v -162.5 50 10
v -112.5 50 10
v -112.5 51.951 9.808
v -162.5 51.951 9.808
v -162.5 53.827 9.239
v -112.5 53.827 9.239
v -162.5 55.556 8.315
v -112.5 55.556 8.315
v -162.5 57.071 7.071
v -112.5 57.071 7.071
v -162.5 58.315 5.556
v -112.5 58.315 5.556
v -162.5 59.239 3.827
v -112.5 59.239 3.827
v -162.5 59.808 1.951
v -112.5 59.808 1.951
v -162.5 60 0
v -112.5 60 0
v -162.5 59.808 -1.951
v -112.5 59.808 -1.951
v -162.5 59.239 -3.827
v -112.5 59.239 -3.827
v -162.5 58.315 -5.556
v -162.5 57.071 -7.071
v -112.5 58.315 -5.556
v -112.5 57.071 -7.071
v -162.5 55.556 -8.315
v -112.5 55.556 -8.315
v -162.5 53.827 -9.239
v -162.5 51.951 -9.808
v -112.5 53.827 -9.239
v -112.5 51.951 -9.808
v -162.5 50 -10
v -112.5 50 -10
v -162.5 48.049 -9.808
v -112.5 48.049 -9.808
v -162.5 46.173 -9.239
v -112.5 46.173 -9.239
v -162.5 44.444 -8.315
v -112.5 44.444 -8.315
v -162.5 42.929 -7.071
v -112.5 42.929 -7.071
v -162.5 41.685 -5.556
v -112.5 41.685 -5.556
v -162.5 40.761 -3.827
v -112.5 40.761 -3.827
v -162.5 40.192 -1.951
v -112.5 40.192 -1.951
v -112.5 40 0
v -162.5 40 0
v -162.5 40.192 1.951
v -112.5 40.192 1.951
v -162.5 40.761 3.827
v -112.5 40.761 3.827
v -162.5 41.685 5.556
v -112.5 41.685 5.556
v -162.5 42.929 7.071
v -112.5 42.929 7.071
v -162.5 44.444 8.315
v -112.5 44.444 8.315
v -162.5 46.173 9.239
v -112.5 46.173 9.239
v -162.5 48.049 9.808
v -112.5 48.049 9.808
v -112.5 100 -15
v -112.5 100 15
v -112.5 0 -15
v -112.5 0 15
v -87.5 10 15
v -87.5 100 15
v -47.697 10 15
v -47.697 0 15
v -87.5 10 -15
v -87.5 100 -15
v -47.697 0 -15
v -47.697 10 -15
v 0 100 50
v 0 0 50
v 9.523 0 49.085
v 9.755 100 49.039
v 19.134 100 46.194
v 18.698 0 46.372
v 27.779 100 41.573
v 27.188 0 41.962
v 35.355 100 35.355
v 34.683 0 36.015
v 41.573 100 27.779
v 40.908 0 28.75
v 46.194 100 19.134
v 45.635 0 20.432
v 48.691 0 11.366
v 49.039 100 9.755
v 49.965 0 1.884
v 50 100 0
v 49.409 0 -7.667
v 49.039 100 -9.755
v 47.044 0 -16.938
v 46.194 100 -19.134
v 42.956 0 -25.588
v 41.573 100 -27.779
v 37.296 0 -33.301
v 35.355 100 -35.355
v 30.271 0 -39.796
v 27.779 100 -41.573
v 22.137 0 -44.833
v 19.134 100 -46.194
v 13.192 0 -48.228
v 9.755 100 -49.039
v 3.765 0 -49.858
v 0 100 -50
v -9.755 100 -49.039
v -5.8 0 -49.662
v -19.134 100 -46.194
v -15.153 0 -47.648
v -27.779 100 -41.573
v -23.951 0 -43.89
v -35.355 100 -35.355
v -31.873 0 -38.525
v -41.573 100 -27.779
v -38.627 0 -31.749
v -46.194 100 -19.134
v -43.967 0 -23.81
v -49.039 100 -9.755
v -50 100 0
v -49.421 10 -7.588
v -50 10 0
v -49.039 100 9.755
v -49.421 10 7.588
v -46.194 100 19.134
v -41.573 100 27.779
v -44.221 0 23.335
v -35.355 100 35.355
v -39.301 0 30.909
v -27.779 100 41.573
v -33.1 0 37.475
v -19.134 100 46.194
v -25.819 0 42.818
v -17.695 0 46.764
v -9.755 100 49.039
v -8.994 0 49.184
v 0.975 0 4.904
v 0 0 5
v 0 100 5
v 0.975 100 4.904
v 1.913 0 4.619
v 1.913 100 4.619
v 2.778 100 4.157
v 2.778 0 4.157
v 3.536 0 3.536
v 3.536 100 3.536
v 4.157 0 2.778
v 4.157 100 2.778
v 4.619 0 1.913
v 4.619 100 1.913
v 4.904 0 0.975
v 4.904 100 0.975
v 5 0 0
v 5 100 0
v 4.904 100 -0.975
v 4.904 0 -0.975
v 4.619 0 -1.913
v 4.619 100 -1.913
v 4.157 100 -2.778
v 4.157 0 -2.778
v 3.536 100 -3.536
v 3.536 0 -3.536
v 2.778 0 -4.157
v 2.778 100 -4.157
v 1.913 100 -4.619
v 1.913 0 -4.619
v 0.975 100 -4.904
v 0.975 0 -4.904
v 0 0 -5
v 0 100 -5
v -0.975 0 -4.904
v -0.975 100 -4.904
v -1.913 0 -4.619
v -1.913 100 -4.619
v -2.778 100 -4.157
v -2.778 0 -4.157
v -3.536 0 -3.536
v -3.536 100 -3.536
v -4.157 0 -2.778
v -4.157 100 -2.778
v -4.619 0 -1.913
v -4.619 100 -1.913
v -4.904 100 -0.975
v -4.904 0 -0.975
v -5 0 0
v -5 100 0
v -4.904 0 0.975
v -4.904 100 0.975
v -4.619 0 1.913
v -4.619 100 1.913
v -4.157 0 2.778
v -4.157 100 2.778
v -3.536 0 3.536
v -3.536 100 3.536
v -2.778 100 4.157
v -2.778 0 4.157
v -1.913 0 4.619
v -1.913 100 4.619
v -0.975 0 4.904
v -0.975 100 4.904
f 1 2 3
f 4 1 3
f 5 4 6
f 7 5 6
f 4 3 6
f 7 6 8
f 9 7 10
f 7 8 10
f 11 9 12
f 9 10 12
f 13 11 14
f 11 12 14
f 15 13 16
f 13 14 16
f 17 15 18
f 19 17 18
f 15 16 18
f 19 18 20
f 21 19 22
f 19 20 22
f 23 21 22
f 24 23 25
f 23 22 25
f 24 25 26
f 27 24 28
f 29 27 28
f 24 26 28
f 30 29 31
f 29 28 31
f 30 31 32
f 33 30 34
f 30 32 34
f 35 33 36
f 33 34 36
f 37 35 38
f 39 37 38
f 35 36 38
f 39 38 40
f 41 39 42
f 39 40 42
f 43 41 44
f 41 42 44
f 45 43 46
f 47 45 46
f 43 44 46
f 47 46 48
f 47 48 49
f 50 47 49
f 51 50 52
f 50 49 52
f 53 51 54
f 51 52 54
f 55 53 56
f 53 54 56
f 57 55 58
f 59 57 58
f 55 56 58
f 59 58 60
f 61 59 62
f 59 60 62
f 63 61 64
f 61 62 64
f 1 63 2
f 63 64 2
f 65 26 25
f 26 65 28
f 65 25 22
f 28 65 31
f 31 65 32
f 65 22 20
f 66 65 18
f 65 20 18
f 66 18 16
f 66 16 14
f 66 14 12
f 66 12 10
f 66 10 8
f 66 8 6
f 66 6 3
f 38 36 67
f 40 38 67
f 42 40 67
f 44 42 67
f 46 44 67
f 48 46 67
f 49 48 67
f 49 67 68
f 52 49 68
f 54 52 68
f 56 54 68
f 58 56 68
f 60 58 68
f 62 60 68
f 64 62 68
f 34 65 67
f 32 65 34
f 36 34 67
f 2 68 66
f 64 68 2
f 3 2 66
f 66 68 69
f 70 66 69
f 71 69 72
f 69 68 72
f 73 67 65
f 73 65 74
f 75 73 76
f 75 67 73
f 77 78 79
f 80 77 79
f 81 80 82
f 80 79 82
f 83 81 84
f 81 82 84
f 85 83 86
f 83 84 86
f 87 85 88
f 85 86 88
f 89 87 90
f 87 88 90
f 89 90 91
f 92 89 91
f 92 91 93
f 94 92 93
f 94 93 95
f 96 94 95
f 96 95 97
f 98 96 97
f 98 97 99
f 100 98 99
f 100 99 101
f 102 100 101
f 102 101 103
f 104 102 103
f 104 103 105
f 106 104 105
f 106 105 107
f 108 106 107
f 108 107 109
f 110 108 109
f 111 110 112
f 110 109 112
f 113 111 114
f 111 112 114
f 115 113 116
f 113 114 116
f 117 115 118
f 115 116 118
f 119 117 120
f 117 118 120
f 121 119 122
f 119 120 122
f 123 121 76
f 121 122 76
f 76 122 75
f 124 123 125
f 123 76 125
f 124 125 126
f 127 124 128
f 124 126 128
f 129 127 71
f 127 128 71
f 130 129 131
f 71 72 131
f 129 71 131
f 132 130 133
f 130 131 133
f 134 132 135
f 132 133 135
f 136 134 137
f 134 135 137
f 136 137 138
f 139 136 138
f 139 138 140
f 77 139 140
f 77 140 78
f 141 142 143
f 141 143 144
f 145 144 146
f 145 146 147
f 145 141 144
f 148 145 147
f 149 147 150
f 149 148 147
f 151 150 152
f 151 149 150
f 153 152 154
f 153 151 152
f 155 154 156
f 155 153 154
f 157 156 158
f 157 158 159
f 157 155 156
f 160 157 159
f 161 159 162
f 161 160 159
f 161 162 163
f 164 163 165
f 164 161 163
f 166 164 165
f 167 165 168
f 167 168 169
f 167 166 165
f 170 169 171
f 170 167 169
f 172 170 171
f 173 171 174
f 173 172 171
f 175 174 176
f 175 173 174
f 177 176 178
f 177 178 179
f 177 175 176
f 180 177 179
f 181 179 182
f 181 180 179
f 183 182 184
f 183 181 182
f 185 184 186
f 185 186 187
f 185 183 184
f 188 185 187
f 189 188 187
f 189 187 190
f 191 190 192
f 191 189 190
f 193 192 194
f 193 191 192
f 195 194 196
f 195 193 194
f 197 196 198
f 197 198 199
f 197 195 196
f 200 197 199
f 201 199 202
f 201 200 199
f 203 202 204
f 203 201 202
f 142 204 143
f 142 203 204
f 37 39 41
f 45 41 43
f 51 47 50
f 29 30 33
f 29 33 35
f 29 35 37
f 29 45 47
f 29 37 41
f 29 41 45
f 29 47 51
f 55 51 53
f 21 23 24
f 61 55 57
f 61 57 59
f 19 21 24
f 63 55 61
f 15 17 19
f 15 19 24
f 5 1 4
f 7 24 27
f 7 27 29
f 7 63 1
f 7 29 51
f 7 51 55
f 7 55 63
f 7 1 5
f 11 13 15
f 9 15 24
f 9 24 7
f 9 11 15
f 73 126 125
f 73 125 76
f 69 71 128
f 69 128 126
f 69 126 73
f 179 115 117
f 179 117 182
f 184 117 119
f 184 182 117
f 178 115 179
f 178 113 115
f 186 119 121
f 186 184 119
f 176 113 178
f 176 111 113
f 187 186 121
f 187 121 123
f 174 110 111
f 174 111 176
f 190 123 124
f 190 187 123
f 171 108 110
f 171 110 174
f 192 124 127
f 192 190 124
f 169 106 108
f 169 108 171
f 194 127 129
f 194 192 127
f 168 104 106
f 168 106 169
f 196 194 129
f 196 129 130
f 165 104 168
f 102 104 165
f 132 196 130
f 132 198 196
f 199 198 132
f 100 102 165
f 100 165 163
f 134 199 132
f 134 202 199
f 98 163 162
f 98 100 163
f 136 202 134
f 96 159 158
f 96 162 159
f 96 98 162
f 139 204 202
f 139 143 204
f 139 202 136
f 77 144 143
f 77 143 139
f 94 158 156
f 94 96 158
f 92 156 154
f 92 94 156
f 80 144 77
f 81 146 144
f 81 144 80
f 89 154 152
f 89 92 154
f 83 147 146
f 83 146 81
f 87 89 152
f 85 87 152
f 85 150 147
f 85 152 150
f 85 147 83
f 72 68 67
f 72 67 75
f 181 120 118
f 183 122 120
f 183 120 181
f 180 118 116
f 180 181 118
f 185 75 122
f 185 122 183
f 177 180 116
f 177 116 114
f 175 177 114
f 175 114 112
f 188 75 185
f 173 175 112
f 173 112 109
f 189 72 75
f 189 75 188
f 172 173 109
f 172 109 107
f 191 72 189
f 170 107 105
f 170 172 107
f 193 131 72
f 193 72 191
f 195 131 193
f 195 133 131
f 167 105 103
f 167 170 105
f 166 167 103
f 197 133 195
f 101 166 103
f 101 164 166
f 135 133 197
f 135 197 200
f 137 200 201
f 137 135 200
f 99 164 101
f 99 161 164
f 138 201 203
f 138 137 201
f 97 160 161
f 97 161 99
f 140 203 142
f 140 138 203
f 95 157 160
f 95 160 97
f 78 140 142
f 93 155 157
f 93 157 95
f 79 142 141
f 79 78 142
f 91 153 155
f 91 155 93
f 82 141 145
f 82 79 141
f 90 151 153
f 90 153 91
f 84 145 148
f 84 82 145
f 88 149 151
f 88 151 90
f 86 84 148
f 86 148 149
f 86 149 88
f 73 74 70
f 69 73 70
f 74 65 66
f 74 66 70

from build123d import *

# Parameters (mm, degrees)
SKETCH2_R           = 50
SKETCH2_R_2         = 5
BOSS_EXTRUDE1_DEPTH = 100
BOSS_EXTRUDE2_DEPTH = 10
SKETCH4_W           = 25
SKETCH4_H           = 30
BOSS_EXTRUDE3_DEPTH = 100
SKETCH5_R           = 10
BOSS_EXTRUDE4_DEPTH = 50


with BuildPart() as part:
    # Sketch2 → Boss-Extrude1 (new body)
    with BuildSketch(Plane(origin=(0, 0, 0), x_dir=(1, 0, 0), z_dir=(0, 1, 0))):
        with Locations(Location((0, 0, 0), (0, 0, 270))):
            Circle(SKETCH2_R)
        with Locations(Location((0, 0, 0), (0, 0, 270))):
            Circle(SKETCH2_R_2, mode=Mode.SUBTRACT)
    extrude(amount=BOSS_EXTRUDE1_DEPTH)

    # Sketch3 → Boss-Extrude2 (add)
    with BuildSketch(Plane.XZ):
        with BuildLine():
            Line((-47.696960071, -15), (-100, -15))
            Line((-100, -15), (-100, 15))
            Line((-100, 15), (-47.696960071, 15))
            ThreePointArc((-47.696960071, 15), (-50, 0), (-47.696960071, -15))
        make_face()
    extrude(amount=-BOSS_EXTRUDE2_DEPTH)

    # Sketch4 → Boss-Extrude3 (add)
    with BuildSketch(Plane.XZ):
        with Locations((-100, 0)):
            Rectangle(SKETCH4_W, SKETCH4_H)
    extrude(amount=-BOSS_EXTRUDE3_DEPTH)

    # Sketch5 → Boss-Extrude4 (add)
    with BuildSketch(Plane.ZY.offset(112.5)):
        with Locations((0, 50)):
            Circle(SKETCH5_R)
    extrude(amount=BOSS_EXTRUDE4_DEPTH)


solid = part.part
